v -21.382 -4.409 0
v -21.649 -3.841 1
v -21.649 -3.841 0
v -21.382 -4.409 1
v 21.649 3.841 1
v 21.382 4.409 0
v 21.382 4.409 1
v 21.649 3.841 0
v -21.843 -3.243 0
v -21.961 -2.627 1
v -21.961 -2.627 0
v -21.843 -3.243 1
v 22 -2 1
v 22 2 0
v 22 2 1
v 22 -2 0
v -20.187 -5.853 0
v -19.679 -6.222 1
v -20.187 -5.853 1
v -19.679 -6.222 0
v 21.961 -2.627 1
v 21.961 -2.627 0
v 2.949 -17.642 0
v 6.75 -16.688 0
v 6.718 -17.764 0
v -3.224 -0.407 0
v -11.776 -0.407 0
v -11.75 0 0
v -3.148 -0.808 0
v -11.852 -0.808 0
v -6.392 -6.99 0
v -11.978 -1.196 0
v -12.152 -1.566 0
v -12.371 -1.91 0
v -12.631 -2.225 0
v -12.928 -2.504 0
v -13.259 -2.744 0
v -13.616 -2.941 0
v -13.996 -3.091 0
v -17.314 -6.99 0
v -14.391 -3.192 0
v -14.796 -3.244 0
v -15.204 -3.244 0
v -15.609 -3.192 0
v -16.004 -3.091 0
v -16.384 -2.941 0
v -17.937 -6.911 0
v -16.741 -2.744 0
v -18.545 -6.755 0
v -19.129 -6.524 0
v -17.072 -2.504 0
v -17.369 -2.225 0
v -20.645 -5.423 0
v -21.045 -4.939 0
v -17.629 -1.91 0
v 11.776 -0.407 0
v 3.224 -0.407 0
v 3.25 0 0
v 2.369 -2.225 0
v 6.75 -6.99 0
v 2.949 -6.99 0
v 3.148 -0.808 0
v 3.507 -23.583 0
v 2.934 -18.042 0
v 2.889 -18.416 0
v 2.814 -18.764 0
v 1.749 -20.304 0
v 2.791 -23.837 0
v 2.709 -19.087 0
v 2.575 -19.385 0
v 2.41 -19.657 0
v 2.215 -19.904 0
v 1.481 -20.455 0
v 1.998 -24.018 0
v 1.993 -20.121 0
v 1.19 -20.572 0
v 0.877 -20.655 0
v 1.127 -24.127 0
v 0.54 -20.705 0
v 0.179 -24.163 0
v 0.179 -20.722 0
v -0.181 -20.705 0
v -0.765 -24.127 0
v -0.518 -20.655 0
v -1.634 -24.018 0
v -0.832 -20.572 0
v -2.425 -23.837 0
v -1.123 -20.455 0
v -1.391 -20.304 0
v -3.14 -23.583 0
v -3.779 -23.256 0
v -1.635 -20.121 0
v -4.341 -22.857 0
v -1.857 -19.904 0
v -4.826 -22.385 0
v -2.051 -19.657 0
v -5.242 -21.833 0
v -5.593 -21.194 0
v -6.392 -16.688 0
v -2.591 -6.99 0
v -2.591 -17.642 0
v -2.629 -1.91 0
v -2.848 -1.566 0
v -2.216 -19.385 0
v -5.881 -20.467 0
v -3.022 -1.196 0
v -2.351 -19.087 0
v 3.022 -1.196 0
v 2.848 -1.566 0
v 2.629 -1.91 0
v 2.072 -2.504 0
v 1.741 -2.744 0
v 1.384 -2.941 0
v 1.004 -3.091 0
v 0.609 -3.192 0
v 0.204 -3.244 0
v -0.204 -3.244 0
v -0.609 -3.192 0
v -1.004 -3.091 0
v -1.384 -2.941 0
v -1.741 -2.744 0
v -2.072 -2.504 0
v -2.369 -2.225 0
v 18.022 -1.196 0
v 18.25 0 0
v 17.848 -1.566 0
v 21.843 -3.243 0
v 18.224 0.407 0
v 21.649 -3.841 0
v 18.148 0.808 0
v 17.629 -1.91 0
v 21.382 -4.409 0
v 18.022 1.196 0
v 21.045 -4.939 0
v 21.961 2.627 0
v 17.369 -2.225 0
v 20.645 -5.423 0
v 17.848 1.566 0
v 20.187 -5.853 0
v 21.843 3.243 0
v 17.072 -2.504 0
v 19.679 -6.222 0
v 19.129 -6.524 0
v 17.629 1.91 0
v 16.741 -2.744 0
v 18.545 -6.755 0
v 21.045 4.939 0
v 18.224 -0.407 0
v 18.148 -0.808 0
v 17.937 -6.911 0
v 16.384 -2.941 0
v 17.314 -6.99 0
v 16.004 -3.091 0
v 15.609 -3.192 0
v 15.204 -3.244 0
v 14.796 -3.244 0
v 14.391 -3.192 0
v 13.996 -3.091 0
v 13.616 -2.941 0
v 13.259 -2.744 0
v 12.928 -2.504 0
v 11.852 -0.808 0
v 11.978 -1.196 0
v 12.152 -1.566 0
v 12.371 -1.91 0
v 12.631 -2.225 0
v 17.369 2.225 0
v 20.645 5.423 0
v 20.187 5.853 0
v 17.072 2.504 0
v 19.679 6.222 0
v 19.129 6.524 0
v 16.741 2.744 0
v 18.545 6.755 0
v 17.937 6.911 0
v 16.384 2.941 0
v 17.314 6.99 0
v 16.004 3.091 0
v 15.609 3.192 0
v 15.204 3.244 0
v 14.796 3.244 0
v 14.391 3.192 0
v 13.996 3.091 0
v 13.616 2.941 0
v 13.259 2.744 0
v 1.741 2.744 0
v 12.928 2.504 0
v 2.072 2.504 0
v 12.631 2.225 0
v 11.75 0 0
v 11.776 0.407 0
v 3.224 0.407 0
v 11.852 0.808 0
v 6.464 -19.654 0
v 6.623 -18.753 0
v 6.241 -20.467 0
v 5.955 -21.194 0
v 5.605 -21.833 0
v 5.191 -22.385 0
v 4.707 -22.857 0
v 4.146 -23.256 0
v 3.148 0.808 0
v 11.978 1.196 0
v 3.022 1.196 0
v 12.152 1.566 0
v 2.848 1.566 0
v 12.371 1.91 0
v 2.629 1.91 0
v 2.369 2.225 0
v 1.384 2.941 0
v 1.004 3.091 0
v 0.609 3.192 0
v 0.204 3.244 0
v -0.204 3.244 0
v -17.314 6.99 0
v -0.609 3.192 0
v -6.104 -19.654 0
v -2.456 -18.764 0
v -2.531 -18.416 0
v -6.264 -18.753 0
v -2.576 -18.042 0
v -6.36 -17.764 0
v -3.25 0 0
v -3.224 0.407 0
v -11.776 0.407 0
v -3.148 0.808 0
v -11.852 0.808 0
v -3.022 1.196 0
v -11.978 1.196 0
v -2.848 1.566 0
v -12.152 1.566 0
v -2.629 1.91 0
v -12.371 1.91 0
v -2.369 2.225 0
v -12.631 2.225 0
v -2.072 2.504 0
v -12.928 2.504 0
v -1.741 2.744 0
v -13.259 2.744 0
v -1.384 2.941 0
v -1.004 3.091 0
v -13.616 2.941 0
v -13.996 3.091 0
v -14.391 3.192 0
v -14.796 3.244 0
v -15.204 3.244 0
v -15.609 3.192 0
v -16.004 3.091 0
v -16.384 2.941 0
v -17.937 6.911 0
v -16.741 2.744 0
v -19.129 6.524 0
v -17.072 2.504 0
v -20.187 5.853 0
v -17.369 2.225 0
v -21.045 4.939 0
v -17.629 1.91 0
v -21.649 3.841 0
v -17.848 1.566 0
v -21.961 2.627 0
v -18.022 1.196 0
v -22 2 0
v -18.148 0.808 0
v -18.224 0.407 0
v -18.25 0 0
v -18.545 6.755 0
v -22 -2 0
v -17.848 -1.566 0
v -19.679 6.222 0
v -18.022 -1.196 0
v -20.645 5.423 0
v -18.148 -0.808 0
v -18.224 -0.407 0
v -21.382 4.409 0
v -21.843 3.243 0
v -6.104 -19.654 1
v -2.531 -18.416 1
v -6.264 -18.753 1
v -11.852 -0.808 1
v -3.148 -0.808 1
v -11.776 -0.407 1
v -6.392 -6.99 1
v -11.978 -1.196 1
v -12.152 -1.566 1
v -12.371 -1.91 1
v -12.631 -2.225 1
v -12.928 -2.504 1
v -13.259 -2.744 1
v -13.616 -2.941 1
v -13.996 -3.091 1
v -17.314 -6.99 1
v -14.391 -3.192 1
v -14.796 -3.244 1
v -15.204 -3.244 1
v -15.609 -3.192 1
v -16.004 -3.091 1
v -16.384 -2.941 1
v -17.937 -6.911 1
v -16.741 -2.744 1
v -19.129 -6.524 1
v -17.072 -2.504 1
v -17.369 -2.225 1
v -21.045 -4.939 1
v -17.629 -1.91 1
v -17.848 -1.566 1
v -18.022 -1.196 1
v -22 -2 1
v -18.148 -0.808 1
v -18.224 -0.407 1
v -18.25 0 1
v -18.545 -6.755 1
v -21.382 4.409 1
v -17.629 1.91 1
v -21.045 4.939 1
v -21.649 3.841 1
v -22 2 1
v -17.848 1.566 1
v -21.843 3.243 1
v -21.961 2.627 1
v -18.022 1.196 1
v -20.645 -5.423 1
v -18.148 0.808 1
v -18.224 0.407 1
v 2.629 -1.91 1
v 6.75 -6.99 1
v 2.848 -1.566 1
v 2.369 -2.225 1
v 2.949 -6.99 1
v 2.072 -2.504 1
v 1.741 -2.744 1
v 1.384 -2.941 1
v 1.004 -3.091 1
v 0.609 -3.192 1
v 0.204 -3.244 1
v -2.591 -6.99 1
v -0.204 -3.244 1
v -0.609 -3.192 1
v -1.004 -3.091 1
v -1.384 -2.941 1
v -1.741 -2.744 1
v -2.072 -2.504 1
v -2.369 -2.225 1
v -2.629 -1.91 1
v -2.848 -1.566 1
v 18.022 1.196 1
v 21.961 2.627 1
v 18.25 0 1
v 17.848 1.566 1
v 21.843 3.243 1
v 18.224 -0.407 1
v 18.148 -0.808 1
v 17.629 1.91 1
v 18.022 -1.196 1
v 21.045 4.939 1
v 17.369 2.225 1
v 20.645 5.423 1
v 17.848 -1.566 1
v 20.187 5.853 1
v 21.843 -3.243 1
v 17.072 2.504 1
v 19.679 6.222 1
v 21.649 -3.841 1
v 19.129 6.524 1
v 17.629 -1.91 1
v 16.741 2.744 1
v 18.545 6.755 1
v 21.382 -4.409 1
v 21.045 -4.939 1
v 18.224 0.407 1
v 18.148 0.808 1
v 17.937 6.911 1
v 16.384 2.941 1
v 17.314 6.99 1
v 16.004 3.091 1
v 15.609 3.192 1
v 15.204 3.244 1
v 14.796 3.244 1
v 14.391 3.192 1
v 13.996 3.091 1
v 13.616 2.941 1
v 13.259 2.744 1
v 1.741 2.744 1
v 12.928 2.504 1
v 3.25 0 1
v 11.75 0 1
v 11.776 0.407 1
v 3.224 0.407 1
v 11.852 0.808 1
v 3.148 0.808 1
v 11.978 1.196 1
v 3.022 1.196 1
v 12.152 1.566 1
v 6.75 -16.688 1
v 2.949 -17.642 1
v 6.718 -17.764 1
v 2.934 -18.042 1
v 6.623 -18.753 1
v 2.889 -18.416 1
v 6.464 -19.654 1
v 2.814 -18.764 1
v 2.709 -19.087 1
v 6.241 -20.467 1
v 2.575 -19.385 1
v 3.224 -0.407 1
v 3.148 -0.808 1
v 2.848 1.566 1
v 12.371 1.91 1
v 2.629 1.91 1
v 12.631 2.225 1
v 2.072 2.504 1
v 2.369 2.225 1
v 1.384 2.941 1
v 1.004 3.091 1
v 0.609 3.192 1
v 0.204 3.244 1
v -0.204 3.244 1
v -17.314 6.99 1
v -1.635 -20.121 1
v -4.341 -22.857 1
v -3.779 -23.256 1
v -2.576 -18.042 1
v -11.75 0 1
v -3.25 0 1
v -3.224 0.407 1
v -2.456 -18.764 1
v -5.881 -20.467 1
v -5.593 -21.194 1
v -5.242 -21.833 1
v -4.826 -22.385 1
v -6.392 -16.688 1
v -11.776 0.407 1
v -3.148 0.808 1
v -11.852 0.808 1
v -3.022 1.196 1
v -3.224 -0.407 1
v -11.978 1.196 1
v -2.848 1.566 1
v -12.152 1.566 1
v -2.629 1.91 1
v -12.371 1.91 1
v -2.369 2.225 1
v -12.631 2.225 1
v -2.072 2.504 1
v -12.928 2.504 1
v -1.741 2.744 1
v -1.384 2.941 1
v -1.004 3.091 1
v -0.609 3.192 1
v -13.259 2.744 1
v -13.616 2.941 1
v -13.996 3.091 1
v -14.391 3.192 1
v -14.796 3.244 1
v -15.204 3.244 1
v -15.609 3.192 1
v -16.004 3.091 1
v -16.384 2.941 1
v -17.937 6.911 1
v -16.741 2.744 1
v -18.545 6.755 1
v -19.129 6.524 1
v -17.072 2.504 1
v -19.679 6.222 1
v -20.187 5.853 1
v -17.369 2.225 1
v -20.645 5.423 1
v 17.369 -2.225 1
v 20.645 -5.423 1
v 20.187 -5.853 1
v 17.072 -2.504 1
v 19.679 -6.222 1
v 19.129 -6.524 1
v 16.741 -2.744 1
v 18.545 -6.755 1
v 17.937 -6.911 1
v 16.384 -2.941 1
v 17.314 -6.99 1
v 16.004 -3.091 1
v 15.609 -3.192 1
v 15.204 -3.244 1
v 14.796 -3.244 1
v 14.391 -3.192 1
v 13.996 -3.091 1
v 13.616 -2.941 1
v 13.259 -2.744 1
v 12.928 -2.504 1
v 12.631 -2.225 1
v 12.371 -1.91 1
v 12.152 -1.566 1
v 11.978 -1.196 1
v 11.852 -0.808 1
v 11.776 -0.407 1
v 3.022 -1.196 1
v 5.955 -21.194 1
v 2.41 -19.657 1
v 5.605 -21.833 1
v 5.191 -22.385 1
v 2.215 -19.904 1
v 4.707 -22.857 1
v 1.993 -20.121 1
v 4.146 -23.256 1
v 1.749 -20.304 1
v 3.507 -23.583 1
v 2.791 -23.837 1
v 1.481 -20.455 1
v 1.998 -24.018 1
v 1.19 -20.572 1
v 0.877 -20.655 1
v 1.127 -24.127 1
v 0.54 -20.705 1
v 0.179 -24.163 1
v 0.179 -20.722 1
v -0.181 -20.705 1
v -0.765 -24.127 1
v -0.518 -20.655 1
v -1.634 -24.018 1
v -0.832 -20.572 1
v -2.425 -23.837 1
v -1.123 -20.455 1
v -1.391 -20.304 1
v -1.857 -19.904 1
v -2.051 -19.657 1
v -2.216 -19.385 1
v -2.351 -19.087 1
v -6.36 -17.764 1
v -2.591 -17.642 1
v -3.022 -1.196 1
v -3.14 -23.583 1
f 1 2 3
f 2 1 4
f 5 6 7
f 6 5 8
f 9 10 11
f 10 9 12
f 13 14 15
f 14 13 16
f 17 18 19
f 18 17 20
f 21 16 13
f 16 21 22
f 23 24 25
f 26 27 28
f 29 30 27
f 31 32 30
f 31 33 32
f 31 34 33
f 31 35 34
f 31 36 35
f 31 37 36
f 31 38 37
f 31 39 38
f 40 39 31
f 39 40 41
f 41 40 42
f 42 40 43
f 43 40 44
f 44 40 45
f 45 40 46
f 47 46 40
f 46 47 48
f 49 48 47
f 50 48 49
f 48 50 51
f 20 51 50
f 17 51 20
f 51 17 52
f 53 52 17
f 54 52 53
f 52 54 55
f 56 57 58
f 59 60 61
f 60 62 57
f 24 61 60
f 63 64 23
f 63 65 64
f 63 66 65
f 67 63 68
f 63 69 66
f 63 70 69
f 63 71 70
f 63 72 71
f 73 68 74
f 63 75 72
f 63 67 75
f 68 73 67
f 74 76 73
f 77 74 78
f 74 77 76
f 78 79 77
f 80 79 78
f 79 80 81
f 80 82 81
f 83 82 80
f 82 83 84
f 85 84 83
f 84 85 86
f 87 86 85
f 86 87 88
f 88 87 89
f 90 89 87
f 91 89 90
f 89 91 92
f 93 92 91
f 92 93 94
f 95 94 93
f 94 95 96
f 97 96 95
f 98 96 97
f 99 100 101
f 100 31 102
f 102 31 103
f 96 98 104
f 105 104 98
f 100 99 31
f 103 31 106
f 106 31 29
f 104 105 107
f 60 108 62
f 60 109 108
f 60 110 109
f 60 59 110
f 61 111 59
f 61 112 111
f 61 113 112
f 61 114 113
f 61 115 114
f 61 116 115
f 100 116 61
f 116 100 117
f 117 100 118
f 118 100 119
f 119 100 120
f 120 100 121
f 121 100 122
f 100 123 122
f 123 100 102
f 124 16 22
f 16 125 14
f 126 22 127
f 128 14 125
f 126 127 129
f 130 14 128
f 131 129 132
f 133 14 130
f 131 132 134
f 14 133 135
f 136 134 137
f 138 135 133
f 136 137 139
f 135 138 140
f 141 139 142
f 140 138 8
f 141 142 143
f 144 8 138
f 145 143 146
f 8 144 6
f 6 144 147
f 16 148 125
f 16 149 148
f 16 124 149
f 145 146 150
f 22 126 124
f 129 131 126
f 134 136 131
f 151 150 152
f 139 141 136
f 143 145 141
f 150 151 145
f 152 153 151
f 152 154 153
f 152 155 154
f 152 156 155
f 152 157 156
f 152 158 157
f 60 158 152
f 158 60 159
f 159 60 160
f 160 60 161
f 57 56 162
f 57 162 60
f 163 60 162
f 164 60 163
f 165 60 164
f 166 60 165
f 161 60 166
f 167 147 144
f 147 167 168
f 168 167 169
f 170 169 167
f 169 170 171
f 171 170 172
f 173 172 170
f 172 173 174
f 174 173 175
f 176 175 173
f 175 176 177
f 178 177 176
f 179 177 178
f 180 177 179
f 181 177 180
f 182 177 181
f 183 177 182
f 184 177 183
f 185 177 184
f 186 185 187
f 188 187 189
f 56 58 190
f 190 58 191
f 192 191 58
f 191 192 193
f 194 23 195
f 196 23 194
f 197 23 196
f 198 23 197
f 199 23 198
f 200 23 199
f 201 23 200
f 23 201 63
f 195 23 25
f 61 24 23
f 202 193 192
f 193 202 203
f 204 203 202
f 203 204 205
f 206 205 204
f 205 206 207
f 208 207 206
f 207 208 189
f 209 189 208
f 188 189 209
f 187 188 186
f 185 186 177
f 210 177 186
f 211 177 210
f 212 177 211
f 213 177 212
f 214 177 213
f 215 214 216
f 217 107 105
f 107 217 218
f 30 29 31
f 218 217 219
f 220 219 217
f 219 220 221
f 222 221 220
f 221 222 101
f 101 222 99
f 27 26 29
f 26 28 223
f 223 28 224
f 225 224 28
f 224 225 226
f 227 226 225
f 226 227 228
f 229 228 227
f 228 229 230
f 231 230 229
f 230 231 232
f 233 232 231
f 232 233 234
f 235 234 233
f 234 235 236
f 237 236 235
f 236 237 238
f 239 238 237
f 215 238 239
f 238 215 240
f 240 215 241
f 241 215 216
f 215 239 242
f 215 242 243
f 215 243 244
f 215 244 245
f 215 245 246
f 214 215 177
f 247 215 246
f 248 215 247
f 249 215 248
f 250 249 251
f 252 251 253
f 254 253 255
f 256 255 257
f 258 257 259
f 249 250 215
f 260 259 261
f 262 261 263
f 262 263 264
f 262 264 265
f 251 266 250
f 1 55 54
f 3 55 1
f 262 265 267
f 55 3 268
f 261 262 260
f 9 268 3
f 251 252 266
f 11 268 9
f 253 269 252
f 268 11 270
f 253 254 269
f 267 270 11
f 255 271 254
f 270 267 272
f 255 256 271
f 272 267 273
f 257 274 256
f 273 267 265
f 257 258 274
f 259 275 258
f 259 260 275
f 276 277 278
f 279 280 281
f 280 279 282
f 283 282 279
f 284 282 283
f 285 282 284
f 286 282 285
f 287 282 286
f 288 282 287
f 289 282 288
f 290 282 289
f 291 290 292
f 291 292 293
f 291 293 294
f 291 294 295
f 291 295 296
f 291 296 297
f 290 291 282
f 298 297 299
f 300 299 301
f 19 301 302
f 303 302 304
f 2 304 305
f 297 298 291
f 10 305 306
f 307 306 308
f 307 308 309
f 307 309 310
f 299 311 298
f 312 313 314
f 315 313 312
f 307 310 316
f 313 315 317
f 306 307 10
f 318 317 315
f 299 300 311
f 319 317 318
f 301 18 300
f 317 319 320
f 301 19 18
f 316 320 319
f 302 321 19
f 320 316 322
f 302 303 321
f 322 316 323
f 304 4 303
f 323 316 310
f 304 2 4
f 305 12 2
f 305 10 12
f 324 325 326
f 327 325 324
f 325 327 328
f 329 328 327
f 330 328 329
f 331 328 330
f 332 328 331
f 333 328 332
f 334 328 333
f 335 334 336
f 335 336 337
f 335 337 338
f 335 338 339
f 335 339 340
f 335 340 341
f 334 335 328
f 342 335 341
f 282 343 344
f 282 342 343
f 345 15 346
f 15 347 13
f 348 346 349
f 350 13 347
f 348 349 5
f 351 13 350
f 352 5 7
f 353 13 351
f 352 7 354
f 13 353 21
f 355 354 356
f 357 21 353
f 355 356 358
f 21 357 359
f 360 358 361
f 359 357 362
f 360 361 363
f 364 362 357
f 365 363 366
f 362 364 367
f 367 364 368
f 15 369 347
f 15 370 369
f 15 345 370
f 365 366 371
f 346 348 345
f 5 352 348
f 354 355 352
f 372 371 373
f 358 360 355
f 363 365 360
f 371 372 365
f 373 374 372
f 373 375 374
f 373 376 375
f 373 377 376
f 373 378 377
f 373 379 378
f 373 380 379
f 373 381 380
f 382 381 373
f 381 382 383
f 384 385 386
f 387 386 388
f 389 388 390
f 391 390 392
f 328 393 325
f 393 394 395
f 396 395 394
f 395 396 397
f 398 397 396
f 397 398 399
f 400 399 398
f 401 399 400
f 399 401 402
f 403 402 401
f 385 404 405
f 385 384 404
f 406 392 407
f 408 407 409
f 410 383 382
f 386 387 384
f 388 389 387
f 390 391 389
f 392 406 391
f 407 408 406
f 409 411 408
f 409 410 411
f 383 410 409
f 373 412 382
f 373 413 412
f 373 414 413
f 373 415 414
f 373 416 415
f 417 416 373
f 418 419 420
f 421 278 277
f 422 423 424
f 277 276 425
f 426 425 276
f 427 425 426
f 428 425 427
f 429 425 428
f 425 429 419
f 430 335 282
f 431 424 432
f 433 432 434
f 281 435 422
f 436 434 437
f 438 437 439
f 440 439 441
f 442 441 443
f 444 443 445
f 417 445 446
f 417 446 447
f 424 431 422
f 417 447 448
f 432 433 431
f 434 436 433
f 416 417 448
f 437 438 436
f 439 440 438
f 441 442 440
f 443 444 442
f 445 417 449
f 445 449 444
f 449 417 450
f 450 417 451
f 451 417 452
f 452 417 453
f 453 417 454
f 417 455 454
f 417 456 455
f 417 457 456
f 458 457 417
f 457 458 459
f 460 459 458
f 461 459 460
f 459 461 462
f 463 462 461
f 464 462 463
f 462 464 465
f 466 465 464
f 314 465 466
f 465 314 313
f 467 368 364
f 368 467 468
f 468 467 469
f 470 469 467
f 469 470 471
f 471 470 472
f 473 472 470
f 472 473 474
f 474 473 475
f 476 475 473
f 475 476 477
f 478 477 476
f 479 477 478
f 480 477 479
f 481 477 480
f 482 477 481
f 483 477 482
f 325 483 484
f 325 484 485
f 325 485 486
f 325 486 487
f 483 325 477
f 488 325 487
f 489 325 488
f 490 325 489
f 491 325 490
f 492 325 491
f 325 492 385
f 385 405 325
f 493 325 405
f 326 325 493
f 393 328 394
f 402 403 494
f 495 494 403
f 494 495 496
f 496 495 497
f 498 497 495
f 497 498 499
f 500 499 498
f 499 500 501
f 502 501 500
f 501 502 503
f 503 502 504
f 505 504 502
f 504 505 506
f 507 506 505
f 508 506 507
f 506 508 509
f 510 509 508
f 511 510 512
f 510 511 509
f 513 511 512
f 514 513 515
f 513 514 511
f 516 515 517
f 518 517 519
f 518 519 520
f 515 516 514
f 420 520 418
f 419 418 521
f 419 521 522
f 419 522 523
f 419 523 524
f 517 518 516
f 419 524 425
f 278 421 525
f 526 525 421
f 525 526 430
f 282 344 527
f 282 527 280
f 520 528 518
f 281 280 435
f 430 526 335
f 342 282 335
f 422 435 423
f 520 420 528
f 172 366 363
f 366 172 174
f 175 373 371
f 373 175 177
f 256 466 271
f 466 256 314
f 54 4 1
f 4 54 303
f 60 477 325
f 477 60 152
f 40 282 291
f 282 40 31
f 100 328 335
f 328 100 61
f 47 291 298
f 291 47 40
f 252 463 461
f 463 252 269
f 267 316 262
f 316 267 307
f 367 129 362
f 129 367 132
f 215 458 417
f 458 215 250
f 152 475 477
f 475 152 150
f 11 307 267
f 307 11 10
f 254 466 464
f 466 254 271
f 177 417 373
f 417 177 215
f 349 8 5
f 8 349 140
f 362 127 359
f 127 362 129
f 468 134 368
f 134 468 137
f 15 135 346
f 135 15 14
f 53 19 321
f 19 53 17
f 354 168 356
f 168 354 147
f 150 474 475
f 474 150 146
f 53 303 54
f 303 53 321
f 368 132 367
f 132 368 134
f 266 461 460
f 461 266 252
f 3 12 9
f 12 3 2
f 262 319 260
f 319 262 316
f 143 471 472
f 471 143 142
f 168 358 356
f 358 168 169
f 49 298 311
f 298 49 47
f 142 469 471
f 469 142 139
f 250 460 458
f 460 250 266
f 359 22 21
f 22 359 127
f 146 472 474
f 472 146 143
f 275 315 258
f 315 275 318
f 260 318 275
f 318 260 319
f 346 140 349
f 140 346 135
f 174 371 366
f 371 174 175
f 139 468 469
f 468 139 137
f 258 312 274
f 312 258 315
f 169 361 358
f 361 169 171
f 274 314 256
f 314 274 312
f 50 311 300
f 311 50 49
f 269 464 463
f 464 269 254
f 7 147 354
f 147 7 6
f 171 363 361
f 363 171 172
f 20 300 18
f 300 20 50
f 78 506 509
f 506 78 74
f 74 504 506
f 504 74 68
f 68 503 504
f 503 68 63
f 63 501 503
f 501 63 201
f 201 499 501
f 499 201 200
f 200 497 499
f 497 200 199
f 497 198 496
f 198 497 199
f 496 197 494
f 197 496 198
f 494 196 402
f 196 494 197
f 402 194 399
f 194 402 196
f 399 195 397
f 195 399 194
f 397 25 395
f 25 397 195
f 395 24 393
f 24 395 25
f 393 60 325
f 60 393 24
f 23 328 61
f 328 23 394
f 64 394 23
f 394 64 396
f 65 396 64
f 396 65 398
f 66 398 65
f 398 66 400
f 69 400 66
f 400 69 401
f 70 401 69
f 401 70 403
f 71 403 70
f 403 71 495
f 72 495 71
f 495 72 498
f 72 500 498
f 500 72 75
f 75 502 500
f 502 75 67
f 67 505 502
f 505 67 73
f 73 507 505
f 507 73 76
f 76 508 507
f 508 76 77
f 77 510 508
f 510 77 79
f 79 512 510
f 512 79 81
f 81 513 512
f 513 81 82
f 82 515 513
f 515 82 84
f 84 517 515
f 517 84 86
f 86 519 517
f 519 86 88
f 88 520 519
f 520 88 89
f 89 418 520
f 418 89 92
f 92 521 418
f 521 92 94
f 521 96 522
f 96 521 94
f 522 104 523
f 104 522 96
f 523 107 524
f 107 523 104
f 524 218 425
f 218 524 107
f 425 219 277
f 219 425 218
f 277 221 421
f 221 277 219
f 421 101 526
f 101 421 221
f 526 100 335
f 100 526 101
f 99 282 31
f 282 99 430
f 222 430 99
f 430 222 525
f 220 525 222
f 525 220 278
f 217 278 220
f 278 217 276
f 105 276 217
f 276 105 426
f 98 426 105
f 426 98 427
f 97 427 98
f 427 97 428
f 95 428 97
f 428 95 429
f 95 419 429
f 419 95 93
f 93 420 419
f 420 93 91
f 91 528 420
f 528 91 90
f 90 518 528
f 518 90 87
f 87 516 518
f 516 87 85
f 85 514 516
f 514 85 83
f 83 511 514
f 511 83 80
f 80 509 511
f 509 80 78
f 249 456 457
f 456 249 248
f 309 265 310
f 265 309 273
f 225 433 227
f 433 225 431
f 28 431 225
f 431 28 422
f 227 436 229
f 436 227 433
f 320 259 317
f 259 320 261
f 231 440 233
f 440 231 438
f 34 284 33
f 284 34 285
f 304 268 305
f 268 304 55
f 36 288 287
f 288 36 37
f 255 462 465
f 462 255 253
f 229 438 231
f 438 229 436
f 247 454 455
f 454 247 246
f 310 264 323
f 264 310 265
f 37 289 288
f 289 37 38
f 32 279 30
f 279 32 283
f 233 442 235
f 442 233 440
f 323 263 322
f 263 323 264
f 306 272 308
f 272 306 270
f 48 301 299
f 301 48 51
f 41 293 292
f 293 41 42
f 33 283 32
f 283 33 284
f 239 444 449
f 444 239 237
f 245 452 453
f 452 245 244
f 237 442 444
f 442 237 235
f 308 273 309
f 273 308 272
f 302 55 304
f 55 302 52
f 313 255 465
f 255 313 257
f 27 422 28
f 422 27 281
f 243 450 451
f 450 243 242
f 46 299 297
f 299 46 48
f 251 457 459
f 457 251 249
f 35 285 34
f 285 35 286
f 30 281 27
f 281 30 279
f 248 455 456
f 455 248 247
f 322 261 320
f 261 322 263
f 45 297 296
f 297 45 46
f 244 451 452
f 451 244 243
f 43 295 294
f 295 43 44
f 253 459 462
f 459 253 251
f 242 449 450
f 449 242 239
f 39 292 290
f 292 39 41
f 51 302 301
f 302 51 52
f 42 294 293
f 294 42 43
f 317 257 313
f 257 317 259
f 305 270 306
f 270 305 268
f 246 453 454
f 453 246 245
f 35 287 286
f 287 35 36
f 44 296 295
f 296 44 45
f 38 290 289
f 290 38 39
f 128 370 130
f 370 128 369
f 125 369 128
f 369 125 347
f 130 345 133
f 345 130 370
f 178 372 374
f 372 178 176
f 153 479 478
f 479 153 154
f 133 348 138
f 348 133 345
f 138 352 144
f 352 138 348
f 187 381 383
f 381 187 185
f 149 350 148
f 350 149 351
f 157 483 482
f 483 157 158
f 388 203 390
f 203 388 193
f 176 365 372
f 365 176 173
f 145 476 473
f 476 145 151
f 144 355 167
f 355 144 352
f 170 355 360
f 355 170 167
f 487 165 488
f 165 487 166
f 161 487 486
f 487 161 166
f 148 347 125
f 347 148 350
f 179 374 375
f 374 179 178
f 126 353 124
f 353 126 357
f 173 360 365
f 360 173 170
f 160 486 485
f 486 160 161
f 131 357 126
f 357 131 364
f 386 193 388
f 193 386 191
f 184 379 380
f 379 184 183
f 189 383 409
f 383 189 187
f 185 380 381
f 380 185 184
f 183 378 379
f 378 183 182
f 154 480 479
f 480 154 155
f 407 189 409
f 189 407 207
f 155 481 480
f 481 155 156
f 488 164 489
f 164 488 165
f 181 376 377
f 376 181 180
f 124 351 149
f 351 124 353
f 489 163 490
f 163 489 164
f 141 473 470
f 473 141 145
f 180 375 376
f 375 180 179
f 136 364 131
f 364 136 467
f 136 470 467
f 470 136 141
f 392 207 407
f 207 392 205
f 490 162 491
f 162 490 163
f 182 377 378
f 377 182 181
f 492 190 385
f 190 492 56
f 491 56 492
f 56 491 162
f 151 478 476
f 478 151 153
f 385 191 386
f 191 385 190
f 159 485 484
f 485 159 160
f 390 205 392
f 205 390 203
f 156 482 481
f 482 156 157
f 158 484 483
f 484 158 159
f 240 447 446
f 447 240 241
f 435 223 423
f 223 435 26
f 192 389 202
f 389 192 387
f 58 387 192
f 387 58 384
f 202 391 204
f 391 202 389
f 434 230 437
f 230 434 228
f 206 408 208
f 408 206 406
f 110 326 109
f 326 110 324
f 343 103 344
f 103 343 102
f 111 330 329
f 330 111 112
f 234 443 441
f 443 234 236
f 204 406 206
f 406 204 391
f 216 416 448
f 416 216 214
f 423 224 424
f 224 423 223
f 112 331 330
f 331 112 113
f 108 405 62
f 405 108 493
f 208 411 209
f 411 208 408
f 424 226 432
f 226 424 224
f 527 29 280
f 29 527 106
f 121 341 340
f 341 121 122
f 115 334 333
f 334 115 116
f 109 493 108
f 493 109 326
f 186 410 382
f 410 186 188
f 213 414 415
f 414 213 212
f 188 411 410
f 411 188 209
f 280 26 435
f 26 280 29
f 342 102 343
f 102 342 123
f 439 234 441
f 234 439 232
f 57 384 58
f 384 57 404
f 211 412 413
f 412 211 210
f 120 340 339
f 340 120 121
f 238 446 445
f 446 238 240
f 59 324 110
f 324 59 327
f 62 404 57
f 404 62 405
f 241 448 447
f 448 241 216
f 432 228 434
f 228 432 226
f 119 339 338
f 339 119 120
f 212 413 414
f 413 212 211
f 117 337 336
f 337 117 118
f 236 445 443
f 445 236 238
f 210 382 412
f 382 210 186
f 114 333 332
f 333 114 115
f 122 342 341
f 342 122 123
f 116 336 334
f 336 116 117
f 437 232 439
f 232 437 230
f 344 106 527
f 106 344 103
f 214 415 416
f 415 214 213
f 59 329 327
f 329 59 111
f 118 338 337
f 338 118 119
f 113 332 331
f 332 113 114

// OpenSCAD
$fn = 50;


difference() {
	union() {
		translate(v = [0, 0, 0]) {
			rotate(a = [0, 0, 0]) {
				hull() {
					translate(v = [-17.0000000000, 2.0000000000, 0]) {
						rotate(a = [0, 0, 0]) {
							translate(v = [0, 0, 0]) {
								rotate(a = [0, 0, 0]) {
									cylinder(h = 1, r = 5);
								}
							}
						}
					}
					translate(v = [17.0000000000, 2.0000000000, 0]) {
						rotate(a = [0, 0, 0]) {
							translate(v = [0, 0, 0]) {
								rotate(a = [0, 0, 0]) {
									cylinder(h = 1, r = 5);
								}
							}
						}
					}
					translate(v = [-17.0000000000, -2.0000000000, 0]) {
						rotate(a = [0, 0, 0]) {
							translate(v = [0, 0, 0]) {
								rotate(a = [0, 0, 0]) {
									cylinder(h = 1, r = 5);
								}
							}
						}
					}
					translate(v = [17.0000000000, -2.0000000000, 0]) {
						rotate(a = [0, 0, 0]) {
							translate(v = [0, 0, 0]) {
								rotate(a = [0, 0, 0]) {
									cylinder(h = 1, r = 5);
								}
							}
						}
					}
				}
			}
		}
		translate(v = [0, -5, 0]) {
			rotate(a = [0, 0, 0]) {
				linear_extrude(height = 1) {
					text(font = "DejaVu Sans Mono:style=Bold", halign = "center", size = 19.0000000000, text = "U", valign = "top");
				}
			}
		}
	}
	union() {
		translate(v = [-15.0000000000, 0.0000000000, -125.0000000000]) {
			rotate(a = [0, 0, 0]) {
				cylinder(h = 250, r = 3.2500000000);
			}
		}
		translate(v = [15.0000000000, 0.0000000000, -125.0000000000]) {
			rotate(a = [0, 0, 0]) {
				cylinder(h = 250, r = 3.2500000000);
			}
		}
		translate(v = [15.0000000000, 0.0000000000, -125.0000000000]) {
			rotate(a = [0, 0, 0]) {
				cylinder(h = 250, r = 3.2500000000);
			}
		}
		translate(v = [0, 0, -125.0000000000]) {
			rotate(a = [0, 0, 0]) {
				cylinder(h = 250, r = 3.2500000000);
			}
		}
	}
}
